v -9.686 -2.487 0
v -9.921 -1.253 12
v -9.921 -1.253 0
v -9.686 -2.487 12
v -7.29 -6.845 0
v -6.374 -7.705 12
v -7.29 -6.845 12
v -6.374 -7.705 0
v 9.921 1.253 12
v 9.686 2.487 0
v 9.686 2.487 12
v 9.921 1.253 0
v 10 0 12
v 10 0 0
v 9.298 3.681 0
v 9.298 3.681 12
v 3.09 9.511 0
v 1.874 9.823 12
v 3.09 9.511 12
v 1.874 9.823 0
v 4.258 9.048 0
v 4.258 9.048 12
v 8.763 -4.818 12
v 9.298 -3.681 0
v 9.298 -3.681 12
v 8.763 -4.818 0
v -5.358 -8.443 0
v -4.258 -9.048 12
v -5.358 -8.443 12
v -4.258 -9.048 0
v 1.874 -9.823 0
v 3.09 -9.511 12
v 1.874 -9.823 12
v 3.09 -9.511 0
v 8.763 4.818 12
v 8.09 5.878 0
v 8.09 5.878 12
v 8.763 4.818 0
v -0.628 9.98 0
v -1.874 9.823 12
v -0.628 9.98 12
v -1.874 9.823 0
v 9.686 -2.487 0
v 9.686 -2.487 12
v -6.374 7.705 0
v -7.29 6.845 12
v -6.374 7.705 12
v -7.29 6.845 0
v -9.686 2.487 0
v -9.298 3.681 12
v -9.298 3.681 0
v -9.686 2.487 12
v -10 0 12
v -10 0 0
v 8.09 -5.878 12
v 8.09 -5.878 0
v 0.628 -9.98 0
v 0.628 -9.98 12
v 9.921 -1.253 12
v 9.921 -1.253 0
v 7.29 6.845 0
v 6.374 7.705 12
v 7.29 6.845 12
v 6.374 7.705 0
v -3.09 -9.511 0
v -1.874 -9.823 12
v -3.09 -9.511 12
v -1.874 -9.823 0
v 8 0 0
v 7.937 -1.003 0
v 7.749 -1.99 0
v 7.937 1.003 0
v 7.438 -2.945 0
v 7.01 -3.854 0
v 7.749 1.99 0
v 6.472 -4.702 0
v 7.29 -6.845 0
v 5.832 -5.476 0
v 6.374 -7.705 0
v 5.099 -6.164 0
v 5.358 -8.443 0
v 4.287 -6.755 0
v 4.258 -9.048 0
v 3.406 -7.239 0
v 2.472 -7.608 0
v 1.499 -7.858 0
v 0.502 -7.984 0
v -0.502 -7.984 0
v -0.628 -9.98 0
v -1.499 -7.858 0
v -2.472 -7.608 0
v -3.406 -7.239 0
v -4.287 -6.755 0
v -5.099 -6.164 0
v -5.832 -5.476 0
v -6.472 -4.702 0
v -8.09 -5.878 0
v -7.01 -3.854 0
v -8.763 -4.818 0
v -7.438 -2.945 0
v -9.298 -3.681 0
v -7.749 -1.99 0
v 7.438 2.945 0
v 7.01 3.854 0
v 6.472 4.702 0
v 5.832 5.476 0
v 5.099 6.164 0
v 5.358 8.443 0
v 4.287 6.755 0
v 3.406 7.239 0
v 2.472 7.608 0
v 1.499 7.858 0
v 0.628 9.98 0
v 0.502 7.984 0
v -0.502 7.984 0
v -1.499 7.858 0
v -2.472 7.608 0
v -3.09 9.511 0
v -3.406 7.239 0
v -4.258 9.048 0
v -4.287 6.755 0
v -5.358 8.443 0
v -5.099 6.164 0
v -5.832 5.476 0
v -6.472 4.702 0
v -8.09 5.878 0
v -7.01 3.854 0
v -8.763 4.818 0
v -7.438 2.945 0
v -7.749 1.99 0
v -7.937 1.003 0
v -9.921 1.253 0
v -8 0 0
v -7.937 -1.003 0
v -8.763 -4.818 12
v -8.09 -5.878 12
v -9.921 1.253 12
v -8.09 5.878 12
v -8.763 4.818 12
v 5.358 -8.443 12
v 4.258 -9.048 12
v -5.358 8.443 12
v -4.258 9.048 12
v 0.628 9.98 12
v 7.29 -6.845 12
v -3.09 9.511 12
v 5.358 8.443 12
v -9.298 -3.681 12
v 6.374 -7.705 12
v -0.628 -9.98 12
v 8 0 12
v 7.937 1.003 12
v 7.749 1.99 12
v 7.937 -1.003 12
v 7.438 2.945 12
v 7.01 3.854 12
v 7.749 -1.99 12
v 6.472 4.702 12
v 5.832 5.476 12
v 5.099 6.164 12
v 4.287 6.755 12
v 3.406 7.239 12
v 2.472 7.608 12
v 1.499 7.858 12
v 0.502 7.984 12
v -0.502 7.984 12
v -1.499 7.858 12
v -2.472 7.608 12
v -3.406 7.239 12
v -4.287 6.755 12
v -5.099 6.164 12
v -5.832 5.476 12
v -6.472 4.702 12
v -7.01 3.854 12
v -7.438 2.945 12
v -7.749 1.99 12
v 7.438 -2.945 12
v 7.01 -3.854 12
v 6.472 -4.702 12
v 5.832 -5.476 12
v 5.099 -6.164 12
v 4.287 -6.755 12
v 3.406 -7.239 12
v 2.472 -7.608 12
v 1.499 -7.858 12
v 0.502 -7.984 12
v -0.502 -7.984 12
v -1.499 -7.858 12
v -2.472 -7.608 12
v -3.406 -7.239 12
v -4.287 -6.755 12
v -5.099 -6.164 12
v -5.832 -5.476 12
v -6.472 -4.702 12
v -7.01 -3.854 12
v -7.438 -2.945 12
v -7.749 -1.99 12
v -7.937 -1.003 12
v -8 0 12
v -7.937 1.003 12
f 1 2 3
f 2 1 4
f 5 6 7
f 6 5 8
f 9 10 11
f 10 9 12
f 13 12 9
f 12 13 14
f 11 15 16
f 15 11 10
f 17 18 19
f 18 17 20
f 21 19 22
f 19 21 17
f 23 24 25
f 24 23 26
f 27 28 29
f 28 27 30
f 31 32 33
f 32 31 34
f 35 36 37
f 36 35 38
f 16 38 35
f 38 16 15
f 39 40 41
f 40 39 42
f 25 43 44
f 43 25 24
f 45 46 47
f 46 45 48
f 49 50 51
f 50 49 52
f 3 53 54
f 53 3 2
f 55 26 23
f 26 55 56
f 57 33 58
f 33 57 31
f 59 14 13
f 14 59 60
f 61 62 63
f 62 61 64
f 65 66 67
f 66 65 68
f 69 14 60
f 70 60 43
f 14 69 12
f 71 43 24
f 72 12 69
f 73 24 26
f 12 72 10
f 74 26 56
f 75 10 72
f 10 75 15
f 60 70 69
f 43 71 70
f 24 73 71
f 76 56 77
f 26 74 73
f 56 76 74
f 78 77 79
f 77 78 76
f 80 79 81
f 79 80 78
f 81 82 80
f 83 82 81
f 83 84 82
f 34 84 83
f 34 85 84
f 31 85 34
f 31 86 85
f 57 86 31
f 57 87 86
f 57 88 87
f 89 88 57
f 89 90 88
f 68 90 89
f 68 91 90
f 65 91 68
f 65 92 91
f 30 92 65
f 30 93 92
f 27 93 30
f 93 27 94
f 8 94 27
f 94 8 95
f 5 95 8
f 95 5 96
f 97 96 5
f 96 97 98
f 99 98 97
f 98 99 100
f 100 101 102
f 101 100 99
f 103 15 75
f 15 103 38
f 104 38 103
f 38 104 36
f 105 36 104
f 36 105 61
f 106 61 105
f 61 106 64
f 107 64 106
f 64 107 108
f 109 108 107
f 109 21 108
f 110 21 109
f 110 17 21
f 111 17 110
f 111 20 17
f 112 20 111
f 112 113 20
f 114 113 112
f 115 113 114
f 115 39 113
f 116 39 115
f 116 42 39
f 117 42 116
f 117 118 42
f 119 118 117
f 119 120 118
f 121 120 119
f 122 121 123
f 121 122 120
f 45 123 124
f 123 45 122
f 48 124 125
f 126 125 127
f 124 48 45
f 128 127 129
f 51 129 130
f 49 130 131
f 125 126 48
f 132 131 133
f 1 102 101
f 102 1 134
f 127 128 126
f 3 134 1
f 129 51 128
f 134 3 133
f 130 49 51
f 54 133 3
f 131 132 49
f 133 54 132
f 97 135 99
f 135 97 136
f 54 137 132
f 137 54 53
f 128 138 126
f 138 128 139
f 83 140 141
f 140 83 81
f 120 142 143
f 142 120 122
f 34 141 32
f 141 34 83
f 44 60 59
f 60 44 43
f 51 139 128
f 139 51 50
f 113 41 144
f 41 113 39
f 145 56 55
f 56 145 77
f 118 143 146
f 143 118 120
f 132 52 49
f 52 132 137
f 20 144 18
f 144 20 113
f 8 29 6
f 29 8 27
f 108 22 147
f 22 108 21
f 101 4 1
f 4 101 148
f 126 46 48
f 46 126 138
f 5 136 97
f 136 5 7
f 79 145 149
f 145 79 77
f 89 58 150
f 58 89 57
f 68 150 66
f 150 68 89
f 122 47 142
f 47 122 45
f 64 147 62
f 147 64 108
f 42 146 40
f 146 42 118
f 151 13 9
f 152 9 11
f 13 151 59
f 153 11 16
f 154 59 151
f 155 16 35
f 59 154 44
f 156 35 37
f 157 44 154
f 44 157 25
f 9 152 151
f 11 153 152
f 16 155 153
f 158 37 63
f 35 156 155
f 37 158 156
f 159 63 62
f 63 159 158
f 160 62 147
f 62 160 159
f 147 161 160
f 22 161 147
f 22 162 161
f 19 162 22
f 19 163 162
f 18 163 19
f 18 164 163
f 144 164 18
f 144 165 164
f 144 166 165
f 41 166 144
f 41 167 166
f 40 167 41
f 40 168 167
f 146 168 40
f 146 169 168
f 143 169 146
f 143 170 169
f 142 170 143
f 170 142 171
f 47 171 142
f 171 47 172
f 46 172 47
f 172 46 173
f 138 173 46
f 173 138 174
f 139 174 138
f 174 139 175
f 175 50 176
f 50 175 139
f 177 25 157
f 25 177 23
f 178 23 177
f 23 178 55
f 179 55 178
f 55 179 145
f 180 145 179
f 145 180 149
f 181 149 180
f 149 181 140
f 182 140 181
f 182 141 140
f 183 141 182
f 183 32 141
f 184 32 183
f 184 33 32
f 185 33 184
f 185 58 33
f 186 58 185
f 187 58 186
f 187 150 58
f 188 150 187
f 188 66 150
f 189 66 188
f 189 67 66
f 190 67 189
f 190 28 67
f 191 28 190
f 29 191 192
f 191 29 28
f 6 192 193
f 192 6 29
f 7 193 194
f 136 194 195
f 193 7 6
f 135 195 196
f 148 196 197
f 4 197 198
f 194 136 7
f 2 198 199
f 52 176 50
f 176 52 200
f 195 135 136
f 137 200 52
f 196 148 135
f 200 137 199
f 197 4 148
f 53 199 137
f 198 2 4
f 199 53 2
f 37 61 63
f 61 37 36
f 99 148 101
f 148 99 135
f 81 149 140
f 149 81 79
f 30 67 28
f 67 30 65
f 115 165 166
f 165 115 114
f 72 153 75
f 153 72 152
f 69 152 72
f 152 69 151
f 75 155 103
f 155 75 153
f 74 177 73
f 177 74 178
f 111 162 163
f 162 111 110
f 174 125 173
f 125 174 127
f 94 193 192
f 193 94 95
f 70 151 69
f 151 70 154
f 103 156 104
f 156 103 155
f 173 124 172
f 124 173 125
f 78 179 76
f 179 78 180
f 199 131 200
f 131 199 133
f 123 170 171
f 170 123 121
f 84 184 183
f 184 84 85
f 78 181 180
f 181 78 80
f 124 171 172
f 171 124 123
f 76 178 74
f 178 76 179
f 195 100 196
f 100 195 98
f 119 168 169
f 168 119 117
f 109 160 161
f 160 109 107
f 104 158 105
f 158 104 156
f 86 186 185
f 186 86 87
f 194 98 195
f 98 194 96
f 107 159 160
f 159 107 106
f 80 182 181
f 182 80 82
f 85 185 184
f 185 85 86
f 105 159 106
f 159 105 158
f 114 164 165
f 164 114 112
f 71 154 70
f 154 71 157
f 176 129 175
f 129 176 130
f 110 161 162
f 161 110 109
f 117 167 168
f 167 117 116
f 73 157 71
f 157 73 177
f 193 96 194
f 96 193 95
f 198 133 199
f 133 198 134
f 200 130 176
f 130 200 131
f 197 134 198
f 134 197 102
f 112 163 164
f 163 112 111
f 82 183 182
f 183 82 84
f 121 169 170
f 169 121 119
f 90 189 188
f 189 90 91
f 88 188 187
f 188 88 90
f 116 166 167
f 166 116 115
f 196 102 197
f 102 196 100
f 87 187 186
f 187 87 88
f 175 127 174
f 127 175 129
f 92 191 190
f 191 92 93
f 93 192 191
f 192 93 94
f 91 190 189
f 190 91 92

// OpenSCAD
$fn = 50;

difference() {
	union() {
		translate(v = [0, 0, 0]) {
			rotate(a = [0, 0, 0]) {
				difference() {
					union() {
						cylinder(h = 12, r = 10);
					}
					union() {
						cylinder(h = 12, r = 8);
					}
				}
			}
		}
	}
	union();
}
